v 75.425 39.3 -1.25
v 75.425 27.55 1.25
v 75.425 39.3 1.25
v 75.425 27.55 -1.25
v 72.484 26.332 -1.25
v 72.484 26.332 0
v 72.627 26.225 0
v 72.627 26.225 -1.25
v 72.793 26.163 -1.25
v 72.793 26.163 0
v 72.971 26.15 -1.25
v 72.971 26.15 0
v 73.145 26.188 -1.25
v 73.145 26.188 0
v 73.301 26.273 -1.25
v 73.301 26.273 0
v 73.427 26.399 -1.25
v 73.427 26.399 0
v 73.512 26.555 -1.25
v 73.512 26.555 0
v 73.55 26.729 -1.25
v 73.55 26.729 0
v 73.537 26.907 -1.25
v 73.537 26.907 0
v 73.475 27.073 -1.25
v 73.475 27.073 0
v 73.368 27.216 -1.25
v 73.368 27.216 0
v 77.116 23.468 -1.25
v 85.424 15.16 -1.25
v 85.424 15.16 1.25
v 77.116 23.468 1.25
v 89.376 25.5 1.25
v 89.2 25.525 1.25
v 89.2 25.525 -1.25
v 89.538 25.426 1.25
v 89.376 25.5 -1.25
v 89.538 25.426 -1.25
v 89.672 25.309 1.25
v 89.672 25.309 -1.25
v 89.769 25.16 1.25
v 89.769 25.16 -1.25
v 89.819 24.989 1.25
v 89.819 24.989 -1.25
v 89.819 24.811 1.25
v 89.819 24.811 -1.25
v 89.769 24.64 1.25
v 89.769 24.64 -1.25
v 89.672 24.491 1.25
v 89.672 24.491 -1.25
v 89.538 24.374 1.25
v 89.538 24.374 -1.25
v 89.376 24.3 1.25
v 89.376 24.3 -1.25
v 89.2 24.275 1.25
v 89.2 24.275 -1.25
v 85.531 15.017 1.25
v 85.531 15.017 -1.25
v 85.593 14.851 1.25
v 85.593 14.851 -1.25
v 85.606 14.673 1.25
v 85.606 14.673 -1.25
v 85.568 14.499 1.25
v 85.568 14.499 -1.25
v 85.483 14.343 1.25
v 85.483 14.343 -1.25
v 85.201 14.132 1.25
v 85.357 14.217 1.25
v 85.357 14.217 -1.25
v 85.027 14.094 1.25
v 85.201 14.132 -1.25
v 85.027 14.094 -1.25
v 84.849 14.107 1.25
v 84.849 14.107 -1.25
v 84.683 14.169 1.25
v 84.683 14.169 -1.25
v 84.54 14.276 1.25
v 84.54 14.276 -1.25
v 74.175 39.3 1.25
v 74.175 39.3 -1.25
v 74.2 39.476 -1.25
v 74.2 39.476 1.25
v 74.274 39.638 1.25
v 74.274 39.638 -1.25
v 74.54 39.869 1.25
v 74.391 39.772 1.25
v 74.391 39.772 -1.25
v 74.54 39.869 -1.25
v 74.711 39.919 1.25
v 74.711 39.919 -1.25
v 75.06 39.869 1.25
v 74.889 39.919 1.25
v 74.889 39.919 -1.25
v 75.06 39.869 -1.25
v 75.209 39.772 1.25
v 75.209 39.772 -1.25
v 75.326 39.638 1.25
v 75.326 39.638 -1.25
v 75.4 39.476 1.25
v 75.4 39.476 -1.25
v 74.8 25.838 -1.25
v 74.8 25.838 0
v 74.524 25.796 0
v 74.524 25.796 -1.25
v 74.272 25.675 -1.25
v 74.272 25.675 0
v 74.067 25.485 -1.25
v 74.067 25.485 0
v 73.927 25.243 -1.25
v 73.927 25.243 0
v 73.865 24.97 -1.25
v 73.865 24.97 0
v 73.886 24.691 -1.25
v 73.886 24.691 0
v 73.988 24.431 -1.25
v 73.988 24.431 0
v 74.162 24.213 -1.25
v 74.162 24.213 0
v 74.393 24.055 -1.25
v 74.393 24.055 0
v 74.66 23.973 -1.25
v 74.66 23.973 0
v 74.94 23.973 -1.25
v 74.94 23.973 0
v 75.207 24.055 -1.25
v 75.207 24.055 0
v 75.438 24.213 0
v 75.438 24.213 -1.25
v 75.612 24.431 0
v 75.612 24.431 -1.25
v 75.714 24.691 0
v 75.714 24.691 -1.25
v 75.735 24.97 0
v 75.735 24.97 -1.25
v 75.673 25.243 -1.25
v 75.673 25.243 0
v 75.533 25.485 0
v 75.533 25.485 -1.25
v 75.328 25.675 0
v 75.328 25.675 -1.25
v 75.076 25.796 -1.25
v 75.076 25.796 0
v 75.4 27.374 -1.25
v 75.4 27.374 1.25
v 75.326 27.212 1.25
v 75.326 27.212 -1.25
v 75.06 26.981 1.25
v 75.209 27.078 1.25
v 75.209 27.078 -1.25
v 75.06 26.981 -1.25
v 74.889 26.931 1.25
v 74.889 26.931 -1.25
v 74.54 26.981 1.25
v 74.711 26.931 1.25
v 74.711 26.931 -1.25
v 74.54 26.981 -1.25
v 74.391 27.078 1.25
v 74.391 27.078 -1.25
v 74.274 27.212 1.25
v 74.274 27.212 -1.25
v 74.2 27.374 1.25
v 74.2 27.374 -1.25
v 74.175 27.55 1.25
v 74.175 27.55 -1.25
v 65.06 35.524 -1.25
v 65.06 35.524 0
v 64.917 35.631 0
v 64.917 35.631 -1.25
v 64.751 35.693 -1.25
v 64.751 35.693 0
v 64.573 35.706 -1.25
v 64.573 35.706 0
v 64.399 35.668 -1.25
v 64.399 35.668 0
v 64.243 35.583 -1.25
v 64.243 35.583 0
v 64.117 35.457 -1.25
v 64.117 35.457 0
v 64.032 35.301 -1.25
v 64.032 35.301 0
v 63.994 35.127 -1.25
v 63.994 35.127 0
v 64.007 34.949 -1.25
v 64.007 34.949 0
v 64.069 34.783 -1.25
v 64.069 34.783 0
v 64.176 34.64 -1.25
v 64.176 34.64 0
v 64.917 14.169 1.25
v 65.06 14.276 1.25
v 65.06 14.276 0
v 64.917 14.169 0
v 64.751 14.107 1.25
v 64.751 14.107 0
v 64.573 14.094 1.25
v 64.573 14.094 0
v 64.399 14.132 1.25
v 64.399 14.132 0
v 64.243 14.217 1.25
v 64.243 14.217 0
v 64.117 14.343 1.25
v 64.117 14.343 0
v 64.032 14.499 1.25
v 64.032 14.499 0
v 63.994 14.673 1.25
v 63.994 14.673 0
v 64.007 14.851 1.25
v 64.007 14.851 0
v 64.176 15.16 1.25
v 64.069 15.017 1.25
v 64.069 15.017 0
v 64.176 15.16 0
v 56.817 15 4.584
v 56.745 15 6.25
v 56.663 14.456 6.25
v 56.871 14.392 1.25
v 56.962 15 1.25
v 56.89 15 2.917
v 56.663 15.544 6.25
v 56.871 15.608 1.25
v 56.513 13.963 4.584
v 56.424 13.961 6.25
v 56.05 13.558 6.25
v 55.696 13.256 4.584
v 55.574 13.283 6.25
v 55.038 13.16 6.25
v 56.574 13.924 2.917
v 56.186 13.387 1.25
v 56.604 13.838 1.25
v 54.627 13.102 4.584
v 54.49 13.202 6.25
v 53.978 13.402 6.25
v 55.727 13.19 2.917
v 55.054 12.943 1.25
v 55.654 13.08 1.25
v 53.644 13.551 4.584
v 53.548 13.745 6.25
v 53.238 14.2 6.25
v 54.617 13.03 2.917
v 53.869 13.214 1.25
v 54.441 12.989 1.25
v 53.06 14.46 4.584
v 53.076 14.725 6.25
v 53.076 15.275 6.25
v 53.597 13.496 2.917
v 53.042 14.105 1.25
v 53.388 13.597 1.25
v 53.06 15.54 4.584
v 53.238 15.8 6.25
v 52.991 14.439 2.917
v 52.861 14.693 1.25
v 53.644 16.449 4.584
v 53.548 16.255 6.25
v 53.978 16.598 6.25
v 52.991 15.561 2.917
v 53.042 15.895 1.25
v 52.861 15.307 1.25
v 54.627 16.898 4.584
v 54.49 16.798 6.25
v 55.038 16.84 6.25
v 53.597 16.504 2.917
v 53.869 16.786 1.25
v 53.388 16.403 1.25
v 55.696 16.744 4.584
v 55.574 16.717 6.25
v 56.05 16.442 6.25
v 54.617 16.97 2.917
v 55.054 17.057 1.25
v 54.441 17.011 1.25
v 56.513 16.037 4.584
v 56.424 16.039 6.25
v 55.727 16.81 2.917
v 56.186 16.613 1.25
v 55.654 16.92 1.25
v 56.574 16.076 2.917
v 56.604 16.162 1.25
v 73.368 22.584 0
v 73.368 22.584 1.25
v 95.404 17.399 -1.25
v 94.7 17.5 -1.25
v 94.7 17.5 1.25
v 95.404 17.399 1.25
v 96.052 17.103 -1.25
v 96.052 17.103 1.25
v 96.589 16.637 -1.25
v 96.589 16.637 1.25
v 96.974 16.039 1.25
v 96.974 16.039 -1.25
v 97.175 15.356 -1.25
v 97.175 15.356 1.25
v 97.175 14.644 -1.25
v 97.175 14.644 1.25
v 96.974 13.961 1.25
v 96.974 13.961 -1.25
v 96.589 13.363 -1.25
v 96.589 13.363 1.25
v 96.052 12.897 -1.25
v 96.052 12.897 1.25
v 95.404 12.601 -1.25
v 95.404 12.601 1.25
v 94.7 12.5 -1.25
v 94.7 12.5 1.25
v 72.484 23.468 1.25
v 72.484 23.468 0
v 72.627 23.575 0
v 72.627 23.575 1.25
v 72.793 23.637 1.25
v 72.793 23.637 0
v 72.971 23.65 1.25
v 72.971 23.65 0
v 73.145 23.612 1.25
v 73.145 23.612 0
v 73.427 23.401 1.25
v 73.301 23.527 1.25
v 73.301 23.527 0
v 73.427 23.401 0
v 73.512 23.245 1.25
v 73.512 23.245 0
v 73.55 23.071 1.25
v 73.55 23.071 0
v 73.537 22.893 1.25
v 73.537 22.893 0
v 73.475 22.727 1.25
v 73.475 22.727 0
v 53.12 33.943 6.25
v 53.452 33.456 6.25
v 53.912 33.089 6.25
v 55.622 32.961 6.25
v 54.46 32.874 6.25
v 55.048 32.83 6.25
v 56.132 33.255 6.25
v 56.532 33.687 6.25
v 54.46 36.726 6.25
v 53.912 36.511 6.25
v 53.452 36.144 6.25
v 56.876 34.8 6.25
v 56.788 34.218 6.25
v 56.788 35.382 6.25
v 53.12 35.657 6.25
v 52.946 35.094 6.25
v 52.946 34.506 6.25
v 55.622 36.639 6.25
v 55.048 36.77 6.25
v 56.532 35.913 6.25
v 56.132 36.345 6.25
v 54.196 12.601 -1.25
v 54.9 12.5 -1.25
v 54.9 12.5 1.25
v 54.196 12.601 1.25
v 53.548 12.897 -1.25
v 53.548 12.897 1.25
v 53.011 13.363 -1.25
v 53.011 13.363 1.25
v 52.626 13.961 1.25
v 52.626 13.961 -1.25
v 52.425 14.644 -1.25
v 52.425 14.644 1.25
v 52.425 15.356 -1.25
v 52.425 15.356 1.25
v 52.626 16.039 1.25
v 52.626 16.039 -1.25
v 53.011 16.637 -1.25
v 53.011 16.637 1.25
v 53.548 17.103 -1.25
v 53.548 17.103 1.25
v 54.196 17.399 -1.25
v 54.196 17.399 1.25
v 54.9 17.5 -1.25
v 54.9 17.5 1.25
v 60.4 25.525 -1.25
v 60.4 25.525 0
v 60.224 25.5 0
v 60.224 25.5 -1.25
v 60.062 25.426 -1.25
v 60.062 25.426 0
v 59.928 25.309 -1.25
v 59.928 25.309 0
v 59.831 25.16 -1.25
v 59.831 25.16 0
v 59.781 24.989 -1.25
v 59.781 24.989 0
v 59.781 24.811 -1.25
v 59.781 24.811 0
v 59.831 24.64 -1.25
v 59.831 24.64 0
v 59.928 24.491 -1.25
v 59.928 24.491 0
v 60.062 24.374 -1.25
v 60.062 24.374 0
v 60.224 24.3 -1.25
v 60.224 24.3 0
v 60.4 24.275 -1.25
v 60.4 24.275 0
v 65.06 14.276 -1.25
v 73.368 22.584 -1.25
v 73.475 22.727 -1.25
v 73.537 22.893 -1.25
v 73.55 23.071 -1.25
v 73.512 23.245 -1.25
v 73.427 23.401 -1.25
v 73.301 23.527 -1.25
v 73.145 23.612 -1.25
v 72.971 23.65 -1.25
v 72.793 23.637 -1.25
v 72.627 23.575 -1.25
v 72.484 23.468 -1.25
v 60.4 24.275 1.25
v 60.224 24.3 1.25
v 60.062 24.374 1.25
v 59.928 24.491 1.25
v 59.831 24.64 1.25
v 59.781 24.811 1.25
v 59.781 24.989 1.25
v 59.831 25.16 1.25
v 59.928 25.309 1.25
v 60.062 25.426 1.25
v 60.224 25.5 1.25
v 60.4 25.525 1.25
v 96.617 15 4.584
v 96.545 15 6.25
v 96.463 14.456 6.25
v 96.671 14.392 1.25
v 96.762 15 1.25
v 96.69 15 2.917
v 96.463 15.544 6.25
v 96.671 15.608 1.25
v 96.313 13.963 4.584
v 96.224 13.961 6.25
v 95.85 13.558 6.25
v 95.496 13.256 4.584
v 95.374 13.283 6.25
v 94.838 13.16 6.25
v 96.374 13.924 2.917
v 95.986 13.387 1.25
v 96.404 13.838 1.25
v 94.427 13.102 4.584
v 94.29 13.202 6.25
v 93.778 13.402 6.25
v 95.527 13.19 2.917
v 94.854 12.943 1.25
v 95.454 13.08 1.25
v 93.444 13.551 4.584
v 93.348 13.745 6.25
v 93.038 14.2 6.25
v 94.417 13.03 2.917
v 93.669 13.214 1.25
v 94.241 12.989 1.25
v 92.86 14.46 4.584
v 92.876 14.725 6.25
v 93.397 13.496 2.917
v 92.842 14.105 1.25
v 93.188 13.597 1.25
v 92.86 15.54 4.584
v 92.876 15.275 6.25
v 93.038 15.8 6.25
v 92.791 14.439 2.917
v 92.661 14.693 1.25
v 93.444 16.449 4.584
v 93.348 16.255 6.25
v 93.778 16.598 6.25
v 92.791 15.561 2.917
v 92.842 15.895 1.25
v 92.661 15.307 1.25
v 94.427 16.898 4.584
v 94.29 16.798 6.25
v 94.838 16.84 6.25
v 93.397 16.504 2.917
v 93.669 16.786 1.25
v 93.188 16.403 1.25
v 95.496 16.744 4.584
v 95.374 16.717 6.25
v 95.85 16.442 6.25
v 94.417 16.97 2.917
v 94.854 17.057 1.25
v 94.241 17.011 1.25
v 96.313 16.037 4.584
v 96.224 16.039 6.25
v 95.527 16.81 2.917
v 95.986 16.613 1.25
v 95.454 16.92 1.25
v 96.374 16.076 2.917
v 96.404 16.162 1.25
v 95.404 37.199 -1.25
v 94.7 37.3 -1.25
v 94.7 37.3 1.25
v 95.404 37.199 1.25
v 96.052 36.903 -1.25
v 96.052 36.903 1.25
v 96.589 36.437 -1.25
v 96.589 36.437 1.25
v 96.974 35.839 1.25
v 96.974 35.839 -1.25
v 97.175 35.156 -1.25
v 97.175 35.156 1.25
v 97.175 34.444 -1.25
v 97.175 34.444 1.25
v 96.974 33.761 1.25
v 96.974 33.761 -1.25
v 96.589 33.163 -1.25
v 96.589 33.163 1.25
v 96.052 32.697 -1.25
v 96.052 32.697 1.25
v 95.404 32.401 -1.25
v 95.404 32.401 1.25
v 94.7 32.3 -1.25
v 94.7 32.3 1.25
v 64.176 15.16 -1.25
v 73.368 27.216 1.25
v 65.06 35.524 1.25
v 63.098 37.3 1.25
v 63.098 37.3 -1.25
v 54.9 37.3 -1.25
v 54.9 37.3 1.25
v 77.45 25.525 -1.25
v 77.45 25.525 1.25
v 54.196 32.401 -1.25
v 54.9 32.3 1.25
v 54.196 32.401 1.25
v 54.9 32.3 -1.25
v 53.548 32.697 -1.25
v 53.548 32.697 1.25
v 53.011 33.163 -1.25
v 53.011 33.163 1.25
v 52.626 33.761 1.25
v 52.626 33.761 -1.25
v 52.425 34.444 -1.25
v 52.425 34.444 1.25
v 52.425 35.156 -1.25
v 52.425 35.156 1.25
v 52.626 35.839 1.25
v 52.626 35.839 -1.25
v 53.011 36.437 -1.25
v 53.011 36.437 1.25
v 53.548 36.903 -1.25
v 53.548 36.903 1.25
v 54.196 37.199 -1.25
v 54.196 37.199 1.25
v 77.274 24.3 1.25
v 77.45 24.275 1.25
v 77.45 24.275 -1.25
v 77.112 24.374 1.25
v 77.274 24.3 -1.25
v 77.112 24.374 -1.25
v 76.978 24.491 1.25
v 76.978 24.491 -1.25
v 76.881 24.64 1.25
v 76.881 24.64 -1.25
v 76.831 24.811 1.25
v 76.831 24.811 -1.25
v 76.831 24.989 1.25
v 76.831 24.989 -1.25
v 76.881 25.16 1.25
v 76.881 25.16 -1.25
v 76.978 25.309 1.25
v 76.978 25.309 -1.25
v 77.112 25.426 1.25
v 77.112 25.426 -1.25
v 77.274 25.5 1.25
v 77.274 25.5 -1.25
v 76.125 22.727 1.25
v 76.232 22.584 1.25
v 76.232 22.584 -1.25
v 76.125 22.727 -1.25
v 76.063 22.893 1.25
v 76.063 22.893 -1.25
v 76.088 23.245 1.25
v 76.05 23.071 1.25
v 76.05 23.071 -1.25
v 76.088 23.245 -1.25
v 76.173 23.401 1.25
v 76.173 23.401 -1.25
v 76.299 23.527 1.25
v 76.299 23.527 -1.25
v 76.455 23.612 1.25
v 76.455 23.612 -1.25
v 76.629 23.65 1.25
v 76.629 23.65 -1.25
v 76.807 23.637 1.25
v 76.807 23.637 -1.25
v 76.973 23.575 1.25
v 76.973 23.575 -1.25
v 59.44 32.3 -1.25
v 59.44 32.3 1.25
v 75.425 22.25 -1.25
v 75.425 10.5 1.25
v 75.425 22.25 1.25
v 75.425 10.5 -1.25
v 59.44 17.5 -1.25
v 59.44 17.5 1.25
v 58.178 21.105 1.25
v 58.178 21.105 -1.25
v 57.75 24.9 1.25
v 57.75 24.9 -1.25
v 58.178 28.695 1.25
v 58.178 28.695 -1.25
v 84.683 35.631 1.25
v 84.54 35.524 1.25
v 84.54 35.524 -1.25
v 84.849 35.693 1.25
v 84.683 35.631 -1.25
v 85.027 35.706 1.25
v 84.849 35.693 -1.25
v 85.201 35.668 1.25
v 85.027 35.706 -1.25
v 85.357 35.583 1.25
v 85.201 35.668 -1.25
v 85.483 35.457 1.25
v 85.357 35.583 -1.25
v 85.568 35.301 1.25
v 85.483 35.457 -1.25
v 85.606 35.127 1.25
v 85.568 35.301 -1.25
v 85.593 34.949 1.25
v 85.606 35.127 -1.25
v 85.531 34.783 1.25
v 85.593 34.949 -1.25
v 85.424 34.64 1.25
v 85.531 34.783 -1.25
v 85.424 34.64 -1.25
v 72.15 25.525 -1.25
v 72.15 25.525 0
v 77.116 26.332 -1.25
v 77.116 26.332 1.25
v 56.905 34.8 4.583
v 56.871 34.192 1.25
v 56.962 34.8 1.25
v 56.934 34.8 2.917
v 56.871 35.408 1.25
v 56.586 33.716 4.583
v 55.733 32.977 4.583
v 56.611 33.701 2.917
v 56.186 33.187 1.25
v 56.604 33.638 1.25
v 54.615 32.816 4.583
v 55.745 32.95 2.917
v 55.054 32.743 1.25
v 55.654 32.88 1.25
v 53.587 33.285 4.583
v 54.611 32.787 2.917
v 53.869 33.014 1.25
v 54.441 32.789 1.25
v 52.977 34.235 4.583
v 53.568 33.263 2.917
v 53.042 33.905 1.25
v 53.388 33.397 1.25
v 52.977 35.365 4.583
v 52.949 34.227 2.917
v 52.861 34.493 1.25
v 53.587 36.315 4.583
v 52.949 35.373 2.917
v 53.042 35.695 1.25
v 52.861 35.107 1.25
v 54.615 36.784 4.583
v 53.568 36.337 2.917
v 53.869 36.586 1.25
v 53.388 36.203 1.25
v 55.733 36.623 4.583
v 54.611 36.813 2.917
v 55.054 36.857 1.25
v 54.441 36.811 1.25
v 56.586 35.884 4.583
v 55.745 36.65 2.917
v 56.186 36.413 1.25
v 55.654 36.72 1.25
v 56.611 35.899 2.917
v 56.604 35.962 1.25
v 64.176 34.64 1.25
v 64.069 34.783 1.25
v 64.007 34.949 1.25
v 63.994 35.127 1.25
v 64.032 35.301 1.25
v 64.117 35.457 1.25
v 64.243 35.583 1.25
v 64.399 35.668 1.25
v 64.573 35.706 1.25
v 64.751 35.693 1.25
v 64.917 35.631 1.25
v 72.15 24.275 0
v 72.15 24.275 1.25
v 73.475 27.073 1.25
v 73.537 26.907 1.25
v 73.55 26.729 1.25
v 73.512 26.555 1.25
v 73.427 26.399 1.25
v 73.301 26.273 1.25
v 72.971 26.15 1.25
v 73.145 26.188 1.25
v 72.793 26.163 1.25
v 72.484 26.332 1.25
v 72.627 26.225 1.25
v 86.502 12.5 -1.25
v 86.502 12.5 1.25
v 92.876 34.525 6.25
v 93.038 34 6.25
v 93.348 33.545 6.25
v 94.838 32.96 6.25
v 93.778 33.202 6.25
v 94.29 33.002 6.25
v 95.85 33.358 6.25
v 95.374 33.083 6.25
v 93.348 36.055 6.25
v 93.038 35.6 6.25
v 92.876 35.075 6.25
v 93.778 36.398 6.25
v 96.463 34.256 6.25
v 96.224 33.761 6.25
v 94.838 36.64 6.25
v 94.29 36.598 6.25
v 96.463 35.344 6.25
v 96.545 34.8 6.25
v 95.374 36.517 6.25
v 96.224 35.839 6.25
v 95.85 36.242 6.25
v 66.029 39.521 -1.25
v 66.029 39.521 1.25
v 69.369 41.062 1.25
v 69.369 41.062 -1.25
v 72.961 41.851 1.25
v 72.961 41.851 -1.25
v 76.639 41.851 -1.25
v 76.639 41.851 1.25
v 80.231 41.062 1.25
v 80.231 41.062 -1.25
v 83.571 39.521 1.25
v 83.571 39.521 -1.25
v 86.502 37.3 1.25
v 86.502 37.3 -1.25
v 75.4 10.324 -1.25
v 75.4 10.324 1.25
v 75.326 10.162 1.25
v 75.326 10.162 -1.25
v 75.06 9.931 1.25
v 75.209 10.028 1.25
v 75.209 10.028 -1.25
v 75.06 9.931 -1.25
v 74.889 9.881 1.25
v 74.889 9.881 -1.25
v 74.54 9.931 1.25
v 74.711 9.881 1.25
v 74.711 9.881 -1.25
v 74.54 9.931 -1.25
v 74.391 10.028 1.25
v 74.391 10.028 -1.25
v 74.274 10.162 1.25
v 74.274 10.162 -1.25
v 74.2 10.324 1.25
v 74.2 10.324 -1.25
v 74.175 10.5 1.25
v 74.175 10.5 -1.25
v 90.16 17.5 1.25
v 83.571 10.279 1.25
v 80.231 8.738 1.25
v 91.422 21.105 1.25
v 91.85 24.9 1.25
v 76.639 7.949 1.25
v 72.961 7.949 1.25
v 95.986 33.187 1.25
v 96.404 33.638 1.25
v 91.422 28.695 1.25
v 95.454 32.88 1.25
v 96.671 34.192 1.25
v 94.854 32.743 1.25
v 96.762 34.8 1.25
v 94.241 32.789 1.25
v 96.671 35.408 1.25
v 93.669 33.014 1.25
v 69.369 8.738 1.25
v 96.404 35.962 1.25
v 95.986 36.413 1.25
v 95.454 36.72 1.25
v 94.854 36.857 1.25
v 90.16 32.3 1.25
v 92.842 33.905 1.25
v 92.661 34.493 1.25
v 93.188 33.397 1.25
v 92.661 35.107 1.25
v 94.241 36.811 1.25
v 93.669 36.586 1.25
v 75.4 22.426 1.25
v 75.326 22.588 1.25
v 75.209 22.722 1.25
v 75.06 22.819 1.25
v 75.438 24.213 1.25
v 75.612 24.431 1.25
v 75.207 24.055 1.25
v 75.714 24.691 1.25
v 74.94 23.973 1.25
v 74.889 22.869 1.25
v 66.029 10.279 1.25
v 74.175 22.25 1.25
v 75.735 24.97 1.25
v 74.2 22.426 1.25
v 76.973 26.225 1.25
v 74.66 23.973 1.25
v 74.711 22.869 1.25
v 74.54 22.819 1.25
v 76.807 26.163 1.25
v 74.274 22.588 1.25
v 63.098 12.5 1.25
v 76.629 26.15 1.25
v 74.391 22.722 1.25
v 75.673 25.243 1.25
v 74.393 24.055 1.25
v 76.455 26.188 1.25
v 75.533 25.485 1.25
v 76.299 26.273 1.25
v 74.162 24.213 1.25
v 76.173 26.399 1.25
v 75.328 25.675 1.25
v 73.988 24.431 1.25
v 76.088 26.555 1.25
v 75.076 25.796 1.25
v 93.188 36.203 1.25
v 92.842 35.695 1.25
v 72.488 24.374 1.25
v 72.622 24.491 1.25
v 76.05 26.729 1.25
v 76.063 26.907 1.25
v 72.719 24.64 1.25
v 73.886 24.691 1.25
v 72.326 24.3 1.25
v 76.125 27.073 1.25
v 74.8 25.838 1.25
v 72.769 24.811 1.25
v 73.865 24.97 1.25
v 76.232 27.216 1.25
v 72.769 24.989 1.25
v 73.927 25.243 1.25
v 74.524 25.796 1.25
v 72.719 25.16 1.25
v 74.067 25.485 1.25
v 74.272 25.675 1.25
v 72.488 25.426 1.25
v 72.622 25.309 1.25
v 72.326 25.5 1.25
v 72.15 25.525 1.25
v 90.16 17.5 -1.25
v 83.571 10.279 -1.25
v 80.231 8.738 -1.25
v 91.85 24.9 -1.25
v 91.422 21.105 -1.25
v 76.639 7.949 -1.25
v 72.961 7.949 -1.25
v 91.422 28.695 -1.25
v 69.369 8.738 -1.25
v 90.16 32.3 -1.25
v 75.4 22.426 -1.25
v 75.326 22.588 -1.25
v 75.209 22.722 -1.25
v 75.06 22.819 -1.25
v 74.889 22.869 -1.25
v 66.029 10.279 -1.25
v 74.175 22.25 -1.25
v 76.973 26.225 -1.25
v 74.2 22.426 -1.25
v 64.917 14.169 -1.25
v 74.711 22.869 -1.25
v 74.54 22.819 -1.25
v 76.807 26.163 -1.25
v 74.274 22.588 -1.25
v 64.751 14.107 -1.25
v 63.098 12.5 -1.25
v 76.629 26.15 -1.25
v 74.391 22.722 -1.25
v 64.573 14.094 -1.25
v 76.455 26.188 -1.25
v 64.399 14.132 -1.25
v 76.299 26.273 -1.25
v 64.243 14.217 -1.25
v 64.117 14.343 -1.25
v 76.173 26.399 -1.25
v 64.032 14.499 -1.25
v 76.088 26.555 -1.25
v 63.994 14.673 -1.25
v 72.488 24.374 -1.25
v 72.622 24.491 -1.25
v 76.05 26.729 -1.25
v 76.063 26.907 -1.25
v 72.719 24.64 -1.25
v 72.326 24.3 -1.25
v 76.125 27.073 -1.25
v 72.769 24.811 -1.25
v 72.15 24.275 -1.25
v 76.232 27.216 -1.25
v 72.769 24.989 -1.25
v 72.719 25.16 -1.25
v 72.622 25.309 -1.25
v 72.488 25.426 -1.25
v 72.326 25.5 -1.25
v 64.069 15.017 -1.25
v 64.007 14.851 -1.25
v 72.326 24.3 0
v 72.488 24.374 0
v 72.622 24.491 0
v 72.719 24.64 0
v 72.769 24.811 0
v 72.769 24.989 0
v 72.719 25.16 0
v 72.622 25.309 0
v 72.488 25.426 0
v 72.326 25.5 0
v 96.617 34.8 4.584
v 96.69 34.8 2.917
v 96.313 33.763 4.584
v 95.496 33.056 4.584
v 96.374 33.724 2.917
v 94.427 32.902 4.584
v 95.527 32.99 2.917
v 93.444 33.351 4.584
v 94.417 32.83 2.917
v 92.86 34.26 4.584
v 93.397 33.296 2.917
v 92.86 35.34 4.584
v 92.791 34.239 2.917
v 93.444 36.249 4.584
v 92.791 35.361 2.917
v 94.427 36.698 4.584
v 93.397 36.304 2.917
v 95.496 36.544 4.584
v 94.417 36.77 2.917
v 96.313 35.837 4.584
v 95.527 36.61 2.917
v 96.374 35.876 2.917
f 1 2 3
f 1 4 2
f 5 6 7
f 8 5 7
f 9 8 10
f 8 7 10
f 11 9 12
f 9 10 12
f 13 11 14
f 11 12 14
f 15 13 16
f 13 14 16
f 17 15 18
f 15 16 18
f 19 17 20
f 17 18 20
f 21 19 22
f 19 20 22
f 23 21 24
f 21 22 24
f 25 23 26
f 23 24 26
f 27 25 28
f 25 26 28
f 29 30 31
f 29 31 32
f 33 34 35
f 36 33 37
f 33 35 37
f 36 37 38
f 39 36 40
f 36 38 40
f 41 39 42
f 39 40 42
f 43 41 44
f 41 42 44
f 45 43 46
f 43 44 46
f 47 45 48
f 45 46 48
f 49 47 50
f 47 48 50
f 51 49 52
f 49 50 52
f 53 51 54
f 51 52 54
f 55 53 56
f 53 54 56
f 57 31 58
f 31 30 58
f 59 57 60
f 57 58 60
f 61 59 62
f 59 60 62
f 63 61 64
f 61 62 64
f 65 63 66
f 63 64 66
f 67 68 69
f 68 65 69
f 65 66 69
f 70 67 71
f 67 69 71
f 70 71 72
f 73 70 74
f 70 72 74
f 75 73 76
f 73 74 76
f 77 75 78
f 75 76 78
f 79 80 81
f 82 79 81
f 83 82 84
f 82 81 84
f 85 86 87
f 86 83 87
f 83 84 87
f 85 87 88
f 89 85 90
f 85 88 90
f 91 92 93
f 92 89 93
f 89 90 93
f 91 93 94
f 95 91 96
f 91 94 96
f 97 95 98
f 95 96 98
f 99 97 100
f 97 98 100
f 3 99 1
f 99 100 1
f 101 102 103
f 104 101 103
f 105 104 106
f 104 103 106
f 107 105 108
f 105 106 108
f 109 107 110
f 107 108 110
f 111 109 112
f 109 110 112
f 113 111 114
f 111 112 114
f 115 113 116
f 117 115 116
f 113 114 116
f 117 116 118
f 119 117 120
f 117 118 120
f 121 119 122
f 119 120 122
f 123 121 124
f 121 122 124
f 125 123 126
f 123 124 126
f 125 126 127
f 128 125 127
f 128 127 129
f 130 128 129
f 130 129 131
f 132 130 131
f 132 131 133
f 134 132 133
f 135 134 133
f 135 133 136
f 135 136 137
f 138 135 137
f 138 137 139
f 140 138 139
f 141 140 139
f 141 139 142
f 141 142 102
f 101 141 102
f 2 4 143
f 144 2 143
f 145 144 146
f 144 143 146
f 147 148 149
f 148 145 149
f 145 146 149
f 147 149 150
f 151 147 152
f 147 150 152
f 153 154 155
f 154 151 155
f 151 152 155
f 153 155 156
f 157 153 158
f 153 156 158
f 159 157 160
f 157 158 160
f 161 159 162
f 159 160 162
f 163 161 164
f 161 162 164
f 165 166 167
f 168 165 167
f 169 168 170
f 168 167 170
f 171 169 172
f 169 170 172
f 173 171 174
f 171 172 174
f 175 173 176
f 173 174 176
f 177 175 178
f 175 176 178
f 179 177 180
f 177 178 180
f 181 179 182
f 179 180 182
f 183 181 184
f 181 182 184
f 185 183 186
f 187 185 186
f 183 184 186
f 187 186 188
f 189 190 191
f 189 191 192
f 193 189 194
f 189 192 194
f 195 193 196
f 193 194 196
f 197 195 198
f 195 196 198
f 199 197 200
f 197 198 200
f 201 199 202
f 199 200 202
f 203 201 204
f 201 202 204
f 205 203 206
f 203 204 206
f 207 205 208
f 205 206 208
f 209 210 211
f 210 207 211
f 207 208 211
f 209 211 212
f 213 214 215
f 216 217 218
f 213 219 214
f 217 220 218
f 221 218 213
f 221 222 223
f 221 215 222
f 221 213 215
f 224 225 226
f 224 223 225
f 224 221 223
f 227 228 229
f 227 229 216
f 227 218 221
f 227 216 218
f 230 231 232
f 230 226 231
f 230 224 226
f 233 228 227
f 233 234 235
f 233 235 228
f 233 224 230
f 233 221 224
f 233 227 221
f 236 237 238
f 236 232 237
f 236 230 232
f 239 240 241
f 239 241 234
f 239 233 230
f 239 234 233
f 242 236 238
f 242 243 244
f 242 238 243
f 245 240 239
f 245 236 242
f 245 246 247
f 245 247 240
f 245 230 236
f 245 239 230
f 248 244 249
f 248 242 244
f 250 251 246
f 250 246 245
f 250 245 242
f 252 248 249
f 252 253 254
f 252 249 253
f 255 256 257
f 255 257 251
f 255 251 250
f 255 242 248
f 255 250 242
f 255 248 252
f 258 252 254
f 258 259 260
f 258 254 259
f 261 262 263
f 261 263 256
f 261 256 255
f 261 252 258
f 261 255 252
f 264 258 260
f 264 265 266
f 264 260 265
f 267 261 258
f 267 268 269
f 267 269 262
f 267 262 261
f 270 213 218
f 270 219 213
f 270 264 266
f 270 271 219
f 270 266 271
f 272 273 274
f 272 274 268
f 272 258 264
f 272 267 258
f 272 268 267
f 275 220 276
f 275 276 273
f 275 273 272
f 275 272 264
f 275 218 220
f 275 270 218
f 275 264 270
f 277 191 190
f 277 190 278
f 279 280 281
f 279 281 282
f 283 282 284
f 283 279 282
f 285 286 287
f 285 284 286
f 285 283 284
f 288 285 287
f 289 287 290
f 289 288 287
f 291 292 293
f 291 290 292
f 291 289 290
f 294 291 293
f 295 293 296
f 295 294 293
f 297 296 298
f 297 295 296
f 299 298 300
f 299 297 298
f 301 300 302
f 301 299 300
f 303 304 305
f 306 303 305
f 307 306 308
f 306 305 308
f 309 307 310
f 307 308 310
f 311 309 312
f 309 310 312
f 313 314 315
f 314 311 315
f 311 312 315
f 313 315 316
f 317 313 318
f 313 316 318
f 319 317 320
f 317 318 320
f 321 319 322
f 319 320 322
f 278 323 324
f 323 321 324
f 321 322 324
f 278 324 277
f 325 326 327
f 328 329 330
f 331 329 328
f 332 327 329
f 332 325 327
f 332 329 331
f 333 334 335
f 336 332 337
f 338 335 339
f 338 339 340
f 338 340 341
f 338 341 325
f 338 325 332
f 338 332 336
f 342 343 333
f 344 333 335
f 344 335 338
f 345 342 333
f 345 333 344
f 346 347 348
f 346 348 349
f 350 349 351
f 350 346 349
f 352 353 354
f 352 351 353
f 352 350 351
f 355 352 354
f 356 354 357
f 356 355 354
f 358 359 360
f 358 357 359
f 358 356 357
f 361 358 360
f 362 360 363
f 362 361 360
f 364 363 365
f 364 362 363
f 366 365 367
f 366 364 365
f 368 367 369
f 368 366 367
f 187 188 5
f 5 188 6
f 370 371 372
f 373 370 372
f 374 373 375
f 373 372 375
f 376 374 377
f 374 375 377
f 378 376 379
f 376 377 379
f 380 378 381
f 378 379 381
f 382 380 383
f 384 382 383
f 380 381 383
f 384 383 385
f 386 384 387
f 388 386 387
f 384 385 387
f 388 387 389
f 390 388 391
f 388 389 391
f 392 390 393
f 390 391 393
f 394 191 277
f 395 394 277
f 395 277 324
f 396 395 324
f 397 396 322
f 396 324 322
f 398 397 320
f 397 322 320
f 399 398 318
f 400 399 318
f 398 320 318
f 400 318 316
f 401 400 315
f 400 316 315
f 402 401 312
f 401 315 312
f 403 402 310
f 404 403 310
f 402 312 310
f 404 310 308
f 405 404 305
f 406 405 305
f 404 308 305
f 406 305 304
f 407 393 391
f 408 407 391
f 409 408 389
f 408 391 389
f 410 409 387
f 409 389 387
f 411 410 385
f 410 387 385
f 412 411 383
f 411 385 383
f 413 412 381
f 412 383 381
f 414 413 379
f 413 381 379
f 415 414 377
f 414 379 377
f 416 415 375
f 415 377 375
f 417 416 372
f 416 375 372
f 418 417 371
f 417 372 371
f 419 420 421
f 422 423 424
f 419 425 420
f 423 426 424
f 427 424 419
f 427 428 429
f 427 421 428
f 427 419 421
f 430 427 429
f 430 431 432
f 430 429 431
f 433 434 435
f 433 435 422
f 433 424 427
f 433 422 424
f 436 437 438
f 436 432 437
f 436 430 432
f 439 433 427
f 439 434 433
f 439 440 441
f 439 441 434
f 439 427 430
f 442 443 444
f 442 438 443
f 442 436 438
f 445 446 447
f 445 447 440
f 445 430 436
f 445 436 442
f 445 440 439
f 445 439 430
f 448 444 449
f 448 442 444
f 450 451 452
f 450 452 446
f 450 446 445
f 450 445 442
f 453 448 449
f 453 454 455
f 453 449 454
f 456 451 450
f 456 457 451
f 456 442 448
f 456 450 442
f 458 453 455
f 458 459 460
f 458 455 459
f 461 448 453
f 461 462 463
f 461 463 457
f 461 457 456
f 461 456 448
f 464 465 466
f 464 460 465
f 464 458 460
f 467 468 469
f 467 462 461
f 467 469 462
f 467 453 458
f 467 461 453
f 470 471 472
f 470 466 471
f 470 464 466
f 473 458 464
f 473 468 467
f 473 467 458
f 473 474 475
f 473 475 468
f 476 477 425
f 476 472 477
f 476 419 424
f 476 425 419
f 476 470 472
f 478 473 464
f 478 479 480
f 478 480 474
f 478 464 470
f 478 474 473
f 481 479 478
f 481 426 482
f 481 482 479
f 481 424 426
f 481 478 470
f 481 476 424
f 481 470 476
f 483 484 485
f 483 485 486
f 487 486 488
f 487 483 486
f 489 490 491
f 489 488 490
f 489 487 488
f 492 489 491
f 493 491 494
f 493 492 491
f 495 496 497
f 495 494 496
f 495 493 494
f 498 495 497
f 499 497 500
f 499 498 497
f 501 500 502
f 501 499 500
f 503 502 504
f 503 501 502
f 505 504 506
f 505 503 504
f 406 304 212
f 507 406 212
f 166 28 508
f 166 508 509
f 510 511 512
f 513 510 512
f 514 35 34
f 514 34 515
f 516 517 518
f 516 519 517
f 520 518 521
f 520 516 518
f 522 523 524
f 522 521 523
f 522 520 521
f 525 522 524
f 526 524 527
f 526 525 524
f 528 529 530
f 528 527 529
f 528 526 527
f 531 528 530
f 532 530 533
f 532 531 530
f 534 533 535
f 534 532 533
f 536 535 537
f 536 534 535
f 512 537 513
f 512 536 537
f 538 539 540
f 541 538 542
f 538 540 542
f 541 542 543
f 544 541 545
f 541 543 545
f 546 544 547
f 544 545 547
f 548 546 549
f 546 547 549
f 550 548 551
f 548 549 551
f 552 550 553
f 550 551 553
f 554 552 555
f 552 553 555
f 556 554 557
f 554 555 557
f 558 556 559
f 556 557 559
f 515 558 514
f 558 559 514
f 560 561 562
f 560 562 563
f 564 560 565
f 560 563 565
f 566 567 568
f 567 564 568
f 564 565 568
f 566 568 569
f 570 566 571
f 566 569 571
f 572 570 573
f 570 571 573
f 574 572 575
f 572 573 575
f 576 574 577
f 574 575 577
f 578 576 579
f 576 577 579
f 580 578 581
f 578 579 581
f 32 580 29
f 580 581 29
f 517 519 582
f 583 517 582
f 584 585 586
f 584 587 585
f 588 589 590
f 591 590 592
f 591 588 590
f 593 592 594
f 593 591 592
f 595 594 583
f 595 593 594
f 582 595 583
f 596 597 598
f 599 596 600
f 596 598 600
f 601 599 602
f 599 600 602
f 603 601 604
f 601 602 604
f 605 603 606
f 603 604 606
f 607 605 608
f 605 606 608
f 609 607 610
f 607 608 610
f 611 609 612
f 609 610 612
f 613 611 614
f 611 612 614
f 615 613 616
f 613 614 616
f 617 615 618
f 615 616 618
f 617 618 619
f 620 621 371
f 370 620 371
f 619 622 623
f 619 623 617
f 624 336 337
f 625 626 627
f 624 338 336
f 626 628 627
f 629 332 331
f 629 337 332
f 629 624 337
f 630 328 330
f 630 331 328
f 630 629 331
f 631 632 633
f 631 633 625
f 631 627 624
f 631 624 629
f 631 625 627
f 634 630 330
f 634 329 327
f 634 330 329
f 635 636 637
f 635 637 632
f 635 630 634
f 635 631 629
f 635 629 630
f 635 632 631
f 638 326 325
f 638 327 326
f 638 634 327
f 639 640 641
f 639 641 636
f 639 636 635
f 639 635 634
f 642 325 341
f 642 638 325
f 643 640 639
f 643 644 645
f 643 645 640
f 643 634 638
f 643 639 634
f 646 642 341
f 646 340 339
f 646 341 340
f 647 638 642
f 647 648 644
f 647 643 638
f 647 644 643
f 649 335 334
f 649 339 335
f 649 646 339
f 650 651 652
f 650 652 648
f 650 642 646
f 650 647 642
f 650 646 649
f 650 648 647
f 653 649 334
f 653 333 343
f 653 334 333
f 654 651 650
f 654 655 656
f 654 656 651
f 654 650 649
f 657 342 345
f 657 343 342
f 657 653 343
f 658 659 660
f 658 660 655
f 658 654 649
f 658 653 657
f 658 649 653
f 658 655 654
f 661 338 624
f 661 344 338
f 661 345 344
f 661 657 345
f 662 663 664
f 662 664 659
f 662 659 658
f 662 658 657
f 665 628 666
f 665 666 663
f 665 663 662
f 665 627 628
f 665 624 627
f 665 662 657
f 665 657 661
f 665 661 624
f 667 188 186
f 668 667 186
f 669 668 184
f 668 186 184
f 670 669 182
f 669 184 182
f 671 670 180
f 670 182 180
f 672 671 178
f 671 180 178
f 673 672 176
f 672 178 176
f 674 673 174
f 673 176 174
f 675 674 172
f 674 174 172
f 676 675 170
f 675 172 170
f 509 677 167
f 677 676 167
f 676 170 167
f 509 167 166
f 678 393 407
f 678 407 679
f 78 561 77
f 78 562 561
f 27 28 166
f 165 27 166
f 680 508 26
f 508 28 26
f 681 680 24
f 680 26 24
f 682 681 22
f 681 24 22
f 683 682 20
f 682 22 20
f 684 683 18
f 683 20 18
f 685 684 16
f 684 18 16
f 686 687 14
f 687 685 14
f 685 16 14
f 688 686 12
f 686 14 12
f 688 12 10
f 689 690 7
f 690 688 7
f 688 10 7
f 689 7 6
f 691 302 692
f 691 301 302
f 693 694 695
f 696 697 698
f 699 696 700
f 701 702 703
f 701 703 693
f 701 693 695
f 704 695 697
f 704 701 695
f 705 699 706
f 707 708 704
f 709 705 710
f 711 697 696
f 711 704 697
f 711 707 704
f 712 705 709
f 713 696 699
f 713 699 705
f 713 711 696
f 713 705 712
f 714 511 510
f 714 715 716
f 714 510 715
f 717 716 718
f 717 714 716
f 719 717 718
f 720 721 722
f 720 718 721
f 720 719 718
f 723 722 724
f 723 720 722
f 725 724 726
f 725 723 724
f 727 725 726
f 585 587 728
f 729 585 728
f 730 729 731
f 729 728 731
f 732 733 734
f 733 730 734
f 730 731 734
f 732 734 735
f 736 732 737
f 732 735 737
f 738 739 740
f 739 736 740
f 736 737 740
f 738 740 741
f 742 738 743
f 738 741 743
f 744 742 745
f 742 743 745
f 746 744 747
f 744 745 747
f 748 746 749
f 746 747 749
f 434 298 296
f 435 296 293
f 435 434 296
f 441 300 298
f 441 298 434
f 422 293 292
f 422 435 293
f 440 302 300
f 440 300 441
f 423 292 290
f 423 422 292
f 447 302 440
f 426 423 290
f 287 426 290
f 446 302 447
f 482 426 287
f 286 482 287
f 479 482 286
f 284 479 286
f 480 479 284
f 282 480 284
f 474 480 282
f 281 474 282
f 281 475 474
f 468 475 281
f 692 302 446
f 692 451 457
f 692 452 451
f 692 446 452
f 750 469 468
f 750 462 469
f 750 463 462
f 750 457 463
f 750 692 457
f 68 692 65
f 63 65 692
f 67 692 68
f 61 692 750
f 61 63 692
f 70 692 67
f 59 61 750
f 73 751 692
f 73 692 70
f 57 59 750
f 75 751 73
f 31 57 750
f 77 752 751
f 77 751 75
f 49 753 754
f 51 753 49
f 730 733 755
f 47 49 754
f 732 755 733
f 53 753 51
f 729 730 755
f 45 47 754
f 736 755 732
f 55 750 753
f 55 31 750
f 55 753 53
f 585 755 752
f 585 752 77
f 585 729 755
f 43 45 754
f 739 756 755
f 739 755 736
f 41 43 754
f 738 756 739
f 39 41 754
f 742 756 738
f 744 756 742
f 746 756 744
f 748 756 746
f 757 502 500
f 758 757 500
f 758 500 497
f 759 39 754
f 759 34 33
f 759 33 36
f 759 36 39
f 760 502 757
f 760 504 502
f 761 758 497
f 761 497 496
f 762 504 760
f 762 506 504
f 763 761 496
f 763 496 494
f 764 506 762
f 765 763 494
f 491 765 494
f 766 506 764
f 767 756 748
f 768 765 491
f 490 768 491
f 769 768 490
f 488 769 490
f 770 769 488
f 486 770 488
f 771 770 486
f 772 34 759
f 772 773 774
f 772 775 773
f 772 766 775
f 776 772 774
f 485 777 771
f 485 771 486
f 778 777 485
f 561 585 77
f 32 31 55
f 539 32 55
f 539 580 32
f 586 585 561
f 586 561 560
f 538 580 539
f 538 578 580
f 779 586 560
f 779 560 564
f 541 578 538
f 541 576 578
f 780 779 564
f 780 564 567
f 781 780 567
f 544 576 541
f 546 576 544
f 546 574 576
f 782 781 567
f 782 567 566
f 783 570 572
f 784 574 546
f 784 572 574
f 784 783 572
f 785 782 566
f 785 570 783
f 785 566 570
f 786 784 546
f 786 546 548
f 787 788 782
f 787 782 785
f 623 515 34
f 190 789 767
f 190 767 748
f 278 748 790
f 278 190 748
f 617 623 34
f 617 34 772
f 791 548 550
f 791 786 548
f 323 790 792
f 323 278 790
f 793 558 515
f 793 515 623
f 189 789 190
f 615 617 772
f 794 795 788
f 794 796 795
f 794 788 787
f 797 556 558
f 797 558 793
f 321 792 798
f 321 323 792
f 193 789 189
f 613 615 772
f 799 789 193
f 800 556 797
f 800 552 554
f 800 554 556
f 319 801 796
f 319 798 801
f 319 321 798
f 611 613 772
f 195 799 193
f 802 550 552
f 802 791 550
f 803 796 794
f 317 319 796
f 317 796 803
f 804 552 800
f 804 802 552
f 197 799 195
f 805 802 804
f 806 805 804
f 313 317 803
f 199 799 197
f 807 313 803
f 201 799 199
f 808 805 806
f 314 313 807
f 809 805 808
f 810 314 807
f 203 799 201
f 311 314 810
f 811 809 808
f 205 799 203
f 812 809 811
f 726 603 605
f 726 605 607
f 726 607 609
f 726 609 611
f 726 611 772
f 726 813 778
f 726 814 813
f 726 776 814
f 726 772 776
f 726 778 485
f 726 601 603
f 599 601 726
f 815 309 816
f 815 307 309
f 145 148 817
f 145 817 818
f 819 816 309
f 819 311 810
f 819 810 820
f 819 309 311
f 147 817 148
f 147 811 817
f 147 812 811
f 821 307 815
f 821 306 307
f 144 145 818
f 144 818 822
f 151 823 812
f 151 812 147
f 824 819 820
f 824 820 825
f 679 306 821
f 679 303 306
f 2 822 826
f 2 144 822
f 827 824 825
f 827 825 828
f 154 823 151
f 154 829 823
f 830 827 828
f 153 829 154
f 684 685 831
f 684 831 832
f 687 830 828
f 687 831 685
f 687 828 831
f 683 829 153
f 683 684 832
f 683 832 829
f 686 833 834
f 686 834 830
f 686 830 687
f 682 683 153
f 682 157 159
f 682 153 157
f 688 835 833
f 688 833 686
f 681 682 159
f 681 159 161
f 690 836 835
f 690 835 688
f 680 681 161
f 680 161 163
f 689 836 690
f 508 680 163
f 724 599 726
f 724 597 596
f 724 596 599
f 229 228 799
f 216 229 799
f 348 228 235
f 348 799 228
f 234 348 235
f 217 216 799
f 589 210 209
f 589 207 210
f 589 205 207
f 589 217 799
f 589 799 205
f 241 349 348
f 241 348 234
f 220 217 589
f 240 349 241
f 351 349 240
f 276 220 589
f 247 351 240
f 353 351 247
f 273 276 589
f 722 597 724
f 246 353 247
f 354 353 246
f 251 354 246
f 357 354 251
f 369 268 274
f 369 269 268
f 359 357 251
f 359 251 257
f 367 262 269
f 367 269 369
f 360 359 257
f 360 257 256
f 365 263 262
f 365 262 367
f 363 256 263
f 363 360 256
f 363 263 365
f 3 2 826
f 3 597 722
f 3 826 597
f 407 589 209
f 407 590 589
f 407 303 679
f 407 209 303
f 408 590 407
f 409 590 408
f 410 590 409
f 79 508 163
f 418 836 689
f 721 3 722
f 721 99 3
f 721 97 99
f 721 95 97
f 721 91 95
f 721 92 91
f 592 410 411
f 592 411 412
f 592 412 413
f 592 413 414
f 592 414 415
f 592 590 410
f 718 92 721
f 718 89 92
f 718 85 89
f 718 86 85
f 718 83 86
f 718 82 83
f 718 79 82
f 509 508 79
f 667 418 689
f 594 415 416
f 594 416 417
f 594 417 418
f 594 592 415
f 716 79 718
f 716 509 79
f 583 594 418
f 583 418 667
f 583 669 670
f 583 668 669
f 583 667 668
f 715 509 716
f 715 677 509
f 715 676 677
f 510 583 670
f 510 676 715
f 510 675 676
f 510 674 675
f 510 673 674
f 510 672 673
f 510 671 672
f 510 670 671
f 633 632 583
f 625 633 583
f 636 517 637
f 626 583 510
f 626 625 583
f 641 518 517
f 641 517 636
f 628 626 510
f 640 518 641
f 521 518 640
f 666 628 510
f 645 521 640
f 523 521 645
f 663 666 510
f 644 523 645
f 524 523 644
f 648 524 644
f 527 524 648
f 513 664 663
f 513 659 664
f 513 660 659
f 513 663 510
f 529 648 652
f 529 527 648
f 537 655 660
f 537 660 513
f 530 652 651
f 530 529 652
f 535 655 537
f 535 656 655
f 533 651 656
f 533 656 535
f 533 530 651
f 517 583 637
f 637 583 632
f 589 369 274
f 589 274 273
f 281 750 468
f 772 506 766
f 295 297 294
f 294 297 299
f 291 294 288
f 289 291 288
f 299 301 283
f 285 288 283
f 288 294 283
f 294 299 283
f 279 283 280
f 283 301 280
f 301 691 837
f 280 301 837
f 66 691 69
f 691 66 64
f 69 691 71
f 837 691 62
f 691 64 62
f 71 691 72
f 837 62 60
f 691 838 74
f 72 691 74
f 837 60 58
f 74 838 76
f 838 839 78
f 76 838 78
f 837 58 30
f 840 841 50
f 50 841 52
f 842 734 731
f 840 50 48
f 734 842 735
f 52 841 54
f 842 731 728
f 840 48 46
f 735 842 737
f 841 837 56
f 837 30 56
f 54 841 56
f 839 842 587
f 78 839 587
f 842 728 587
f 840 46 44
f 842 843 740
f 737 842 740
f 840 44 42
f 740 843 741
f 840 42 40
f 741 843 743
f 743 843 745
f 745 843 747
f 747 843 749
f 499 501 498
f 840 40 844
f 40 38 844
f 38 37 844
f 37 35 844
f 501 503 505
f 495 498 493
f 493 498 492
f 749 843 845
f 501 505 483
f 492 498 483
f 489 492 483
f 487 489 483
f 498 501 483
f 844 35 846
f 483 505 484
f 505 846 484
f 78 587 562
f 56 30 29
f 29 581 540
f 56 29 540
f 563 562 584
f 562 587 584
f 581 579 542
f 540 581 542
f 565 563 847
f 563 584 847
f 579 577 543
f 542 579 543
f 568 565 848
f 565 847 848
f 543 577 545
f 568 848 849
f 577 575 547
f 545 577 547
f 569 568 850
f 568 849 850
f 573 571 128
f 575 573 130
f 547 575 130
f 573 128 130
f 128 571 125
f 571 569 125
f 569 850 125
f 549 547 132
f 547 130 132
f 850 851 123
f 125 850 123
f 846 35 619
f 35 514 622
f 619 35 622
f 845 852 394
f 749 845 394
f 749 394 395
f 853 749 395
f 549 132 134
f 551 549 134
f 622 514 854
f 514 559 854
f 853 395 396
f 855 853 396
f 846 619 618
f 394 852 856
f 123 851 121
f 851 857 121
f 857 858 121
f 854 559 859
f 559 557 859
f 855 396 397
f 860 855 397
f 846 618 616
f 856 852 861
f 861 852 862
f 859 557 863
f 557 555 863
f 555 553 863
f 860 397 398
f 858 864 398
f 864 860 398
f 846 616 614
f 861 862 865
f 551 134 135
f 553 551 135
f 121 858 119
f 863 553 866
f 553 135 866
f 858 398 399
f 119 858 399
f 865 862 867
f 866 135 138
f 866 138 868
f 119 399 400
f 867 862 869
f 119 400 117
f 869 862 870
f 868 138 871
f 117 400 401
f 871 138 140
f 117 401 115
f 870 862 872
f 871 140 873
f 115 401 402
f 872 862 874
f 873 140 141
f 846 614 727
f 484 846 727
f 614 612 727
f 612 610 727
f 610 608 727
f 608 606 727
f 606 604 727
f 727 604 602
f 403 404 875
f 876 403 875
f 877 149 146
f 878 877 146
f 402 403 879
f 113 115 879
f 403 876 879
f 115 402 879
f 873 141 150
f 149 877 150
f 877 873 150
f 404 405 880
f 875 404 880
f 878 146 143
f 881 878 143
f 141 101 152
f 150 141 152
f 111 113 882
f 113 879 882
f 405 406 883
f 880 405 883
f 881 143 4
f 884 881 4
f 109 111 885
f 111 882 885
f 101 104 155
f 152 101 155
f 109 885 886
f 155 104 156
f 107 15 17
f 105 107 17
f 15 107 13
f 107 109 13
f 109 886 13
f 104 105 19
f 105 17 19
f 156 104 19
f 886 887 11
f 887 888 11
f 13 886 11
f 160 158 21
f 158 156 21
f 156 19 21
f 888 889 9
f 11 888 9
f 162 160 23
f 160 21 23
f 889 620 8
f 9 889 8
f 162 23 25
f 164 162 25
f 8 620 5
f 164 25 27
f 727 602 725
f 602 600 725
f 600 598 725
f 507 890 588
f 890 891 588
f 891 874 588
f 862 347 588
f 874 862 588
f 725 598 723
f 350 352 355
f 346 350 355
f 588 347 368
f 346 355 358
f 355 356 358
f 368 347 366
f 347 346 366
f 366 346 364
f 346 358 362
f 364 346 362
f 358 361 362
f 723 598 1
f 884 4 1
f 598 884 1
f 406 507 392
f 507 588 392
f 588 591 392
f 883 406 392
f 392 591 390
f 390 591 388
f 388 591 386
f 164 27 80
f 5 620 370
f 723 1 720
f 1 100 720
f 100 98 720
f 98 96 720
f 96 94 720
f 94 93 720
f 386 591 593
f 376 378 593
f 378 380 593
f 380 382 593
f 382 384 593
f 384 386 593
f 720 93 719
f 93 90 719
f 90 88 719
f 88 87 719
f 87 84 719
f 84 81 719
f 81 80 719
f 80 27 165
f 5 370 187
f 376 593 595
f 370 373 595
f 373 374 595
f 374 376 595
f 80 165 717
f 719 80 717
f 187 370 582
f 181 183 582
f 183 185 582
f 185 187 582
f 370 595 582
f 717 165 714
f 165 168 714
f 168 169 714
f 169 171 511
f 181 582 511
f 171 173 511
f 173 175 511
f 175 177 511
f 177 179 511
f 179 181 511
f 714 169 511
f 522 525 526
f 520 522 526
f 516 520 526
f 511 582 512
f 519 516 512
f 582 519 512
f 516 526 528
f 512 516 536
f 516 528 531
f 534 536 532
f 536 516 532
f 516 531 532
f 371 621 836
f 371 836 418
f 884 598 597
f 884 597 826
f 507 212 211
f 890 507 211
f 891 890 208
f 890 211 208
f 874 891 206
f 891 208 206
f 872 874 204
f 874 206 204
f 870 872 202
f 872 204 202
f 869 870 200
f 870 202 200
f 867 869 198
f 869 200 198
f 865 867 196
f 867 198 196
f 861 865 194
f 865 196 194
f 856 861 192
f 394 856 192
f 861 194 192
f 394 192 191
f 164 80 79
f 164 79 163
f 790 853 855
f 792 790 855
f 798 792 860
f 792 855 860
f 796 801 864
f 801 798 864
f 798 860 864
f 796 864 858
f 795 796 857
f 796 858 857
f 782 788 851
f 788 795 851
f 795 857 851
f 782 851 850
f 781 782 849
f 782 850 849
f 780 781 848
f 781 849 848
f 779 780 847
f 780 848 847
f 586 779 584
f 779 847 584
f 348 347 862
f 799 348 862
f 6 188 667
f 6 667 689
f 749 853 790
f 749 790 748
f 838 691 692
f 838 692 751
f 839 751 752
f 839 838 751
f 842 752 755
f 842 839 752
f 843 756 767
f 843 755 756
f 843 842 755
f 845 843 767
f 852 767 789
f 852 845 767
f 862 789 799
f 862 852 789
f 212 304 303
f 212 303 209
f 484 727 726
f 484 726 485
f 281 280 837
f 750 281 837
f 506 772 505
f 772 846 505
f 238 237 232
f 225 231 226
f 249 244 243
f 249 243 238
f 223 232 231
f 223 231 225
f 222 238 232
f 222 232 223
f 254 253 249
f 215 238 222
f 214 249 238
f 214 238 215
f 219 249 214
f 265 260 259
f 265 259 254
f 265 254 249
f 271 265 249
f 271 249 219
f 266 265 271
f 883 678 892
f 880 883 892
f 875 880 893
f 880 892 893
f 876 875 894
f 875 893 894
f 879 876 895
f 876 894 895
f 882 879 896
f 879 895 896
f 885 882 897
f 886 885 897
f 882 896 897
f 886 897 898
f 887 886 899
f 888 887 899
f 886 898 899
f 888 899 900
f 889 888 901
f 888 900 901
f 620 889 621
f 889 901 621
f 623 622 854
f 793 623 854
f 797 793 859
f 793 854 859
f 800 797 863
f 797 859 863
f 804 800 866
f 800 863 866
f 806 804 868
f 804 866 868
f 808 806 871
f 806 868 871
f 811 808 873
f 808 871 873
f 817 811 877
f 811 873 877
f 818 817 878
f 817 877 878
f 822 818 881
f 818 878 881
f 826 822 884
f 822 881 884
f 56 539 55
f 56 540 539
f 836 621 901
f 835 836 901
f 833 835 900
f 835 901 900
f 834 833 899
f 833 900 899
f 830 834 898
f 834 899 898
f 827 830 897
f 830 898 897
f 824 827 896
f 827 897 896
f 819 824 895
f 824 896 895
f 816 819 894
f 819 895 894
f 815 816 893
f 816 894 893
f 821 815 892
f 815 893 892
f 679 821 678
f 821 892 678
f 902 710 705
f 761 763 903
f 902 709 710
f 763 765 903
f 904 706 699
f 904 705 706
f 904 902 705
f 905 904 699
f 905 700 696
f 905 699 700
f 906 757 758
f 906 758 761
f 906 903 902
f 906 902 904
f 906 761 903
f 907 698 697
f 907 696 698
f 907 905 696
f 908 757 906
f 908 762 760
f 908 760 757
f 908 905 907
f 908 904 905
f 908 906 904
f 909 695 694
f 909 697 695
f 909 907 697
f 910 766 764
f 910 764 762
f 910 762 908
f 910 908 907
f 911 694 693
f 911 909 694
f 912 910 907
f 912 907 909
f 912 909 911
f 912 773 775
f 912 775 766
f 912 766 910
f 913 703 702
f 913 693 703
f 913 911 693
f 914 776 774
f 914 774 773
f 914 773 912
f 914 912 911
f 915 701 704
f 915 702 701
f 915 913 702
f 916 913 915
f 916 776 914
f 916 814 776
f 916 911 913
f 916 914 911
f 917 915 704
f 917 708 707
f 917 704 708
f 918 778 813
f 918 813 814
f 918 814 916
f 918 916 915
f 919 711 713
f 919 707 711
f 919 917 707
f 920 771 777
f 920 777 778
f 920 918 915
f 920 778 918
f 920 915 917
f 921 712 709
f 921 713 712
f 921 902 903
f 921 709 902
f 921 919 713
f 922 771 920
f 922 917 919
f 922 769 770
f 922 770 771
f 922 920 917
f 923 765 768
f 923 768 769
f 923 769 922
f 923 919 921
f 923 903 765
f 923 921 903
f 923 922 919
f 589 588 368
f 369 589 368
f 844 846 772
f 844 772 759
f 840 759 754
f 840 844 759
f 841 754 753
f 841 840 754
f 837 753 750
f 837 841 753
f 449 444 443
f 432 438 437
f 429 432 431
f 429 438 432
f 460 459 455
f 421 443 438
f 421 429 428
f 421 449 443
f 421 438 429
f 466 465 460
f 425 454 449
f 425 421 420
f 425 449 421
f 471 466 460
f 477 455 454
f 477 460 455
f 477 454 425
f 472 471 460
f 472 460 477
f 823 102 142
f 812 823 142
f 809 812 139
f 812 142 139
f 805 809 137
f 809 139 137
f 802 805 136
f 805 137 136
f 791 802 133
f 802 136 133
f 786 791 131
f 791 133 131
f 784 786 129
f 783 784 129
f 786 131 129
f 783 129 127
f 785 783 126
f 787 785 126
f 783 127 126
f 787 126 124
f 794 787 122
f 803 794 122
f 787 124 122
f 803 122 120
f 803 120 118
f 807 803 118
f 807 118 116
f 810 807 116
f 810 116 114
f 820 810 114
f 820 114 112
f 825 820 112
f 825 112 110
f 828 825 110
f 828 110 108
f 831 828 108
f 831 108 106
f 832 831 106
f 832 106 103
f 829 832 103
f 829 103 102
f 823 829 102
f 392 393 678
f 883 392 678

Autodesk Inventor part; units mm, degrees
ref_plane "YZ Plane" through (0, 0, 0) normal (1, 0, 0) x (0, 1, 0)
ref_plane "XZ Plane" through (0, 0, 0) normal (0, 1, 0) x (-1, 0, 0)
ref_plane "XY Plane" through (0, 0, 0) normal (0, 0, 1) x (1, 0, 0)
sketch "Sketch2" plane through (0, 0, 0) normal (0, 0, 1) x (0, 1, 0)
  line L0 (24.9, -57.75) -> (24.9, -91.85)
  circle A0 centre (24.9, -74.8) radius 17.05
  circle A1 centre (24.9, -74.8) radius 0.9375
  line L1 (24.9, -74.8) -> (36.9562, -86.8562)
  line L2 (24.9, -74.8) -> (41.95, -74.8) construction
  line L3 (26.7738, -76.6738) -> (35.0823, -84.9823) construction
  line L4 (26.3319, -77.1158) -> (34.6404, -85.4243)
  line L5 (35.5243, -84.5404) -> (27.2158, -76.2319)
  arc A2 (27.2158, -76.2319) -> (26.3319, -77.1158) centre (26.7738, -76.6738) ccw
  arc A3 (34.6404, -85.4243) -> (35.5243, -84.5404) centre (35.0823, -84.9823) ccw
  line L6 (30.9281, -80.8281) -> (42.6781, -80.8281) construction
  line L7 (34.8, -54.9) -> (34.8, -60.9186) construction
  line L8 (32.3, -54.9) -> (32.3, -60.9186)
  line L9 (37.3, -60.9186) -> (37.3, -54.9)
  arc A4 (37.3, -54.9) -> (32.3, -54.9) centre (34.8, -54.9) ccw
  arc A5 (32.3, -60.9186) -> (37.3, -60.9186) centre (34.8, -60.9186) ccw
  line L10 (15, -54.9) -> (15, -60.9186) construction
  line L11 (12.5, -54.9) -> (12.5, -60.9186)
  line L12 (17.5, -60.9186) -> (17.5, -54.9)
  arc A6 (17.5, -54.9) -> (12.5, -54.9) centre (15, -54.9) ccw
  arc A7 (12.5, -60.9186) -> (17.5, -60.9186) centre (15, -60.9186) ccw
  line L13 (15, -94.7) -> (15, -88.6814) construction
  line L14 (17.5, -94.7) -> (17.5, -88.6814)
  line L15 (12.5, -88.6814) -> (12.5, -94.7)
  arc A8 (12.5, -94.7) -> (17.5, -94.7) centre (15, -94.7) ccw
  arc A9 (17.5, -88.6814) -> (12.5, -88.6814) centre (15, -88.6814) ccw
  line L16 (34.8, -94.7) -> (34.8, -88.6814) construction
  line L17 (37.3, -94.7) -> (37.3, -88.6814)
  line L18 (32.3, -88.6814) -> (32.3, -94.7)
  arc A10 (32.3, -94.7) -> (37.3, -94.7) centre (34.8, -94.7) ccw
  arc A11 (37.3, -88.6814) -> (32.3, -88.6814) centre (34.8, -88.6814) ccw
  line L19 (39.3, -74.175) -> (27.55, -74.175)
  arc A12 (39.3, -75.425) -> (39.3, -74.175) centre (39.3, -74.8) ccw
  line L20 (27.55, -75.425) -> (39.3, -75.425)
  arc A13 (27.55, -74.175) -> (27.55, -75.425) centre (27.55, -74.8) ccw
  line L21 (34.6404, -64.1757) -> (26.3319, -72.4842)
  arc A14 (35.5243, -65.0596) -> (34.6404, -64.1757) centre (35.0823, -64.6177) ccw
  line L22 (27.2158, -73.3681) -> (35.5243, -65.0596)
  arc A15 (26.3319, -72.4842) -> (27.2158, -73.3681) centre (26.7738, -72.9262) ccw
  line L23 (24.275, -60.4) -> (24.275, -72.15)
  arc A16 (25.525, -60.4) -> (24.275, -60.4) centre (24.9, -60.4) ccw
  line L24 (25.525, -72.15) -> (25.525, -60.4)
  arc A17 (24.275, -72.15) -> (25.525, -72.15) centre (24.9, -72.15) ccw
  line L25 (14.2757, -65.0596) -> (22.5842, -73.3681)
  arc A18 (15.1596, -64.1757) -> (14.2757, -65.0596) centre (14.7177, -64.6177) ccw
  line L26 (23.4681, -72.4842) -> (15.1596, -64.1757)
  arc A19 (22.5842, -73.3681) -> (23.4681, -72.4842) centre (23.0262, -72.9262) ccw
  line L27 (10.5, -75.425) -> (22.25, -75.425)
  arc A20 (10.5, -74.175) -> (10.5, -75.425) centre (10.5, -74.8) ccw
  line L28 (22.25, -74.175) -> (10.5, -74.175)
  arc A21 (22.25, -75.425) -> (22.25, -74.175) centre (22.25, -74.8) ccw
  line L29 (15.1596, -85.4243) -> (23.4681, -77.1158)
  arc A22 (14.2757, -84.5404) -> (15.1596, -85.4243) centre (14.7177, -84.9823) ccw
  line L30 (22.5842, -76.2319) -> (14.2757, -84.5404)
  arc A23 (23.4681, -77.1158) -> (22.5842, -76.2319) centre (23.0262, -76.6738) ccw
  line L31 (25.525, -89.2) -> (25.525, -77.45)
  arc A24 (24.275, -89.2) -> (25.525, -89.2) centre (24.9, -89.2) ccw
  line L32 (24.275, -77.45) -> (24.275, -89.2)
  arc A25 (25.525, -77.45) -> (24.275, -77.45) centre (24.9, -77.45) ccw
  line L33 (37.3, -60.9186) -> (37.3, -88.6814)
  line L34 (12.5, -88.6814) -> (12.5, -60.9186)
  line L35 (0.025, -97.7) -> (0.025, -51.9) projected
  line L36 (42.1, -97.7) -> (0.025, -97.7) projected
  line L37 (42.1, -97.7) -> (42.1, -91.85) projected
  line L38 (7.7, -91.85) -> (42.1, -91.85) projected
  line L39 (7.7, -57.75) -> (7.7, -91.85) projected
  line L40 (7.7, -57.75) -> (42.1, -57.75) projected
  line L41 (42.1, -57.75) -> (42.1, -51.9) projected
  line L42 (0.025, -51.9) -> (42.1, -51.9) projected
  circle A26 centre (34.8, -94.7) radius 2.0625 projected
  circle A27 centre (34.8, -54.9) radius 2.0625 projected
  circle A28 centre (15, -94.7) radius 2.0625 projected
  circle A29 centre (15, -54.9) radius 2.0625 projected
  point P0 (0, 0)
  point P1 (34.8, -57.9093)
  point P2 (15, -57.9093)
  point P3 (15, -91.6907)
  point P4 (34.8, -91.6907)
  point P5 (17.5, -59.4396)
  point P6 (13.0765, -62.5156)
  point P7 (13.0765, -87.0844)
  point P8 (17.5, -90.1604)
  point P9 (32.3, -90.1604)
  point P10 (36.7235, -87.0844)
  point P11 (36.7235, -62.5156)
  point P12 (32.3, -59.4396)
  point P13 (12.5, -63.0978)
  point P14 (12.5, -86.5022)
  point P15 (37.3, -86.5022)
  point P16 (37.3, -63.0978)
  dimension "d32" = 1.875
  dimension "d33" = 45
  dimension "d34" = 5.875
  dimension "d35" = 45
  dimension "d36" = 1.25
  dimension "d37" = 5
  dimension "d38" = 5
  dimension "d39" = 5
  dimension "d40" = 5
  dimension "d43" = 360
extrude "Extrusion2" add sketch "Sketch2" along normal mid plane 2.5 contours A0 L8 A5 L33 L19 A13 L20 L1 A3 L5 A2 A1 L0 A17 L24 A16 | L0 A16 L23 A17 A1 A25 L32 A24 A0 L14 A9 L34 L27 A21 L28 A7 L12 | L8 L40 L9 A5 A0 | A0 A5 L8 | L12 A7 A0 | A0 A7 L11 L40 L12 | L40 L11 A6 L12 | L8 A4 L9 L40 | A5 L33 A0 | A0 L34 A7 | A0 L33 L20 A12 L19 | L34 L28 A20 L27 A0 | A1 L1 A2 L4 A3 A0 A11 L18 L0 A24 L31 A25 | A0 A9 L34 | L33 A11 A0 | A9 L14 A0 | A0 L14 L38 L15 A9 | L38 L14 A8 L15 | L17 L38 L18 A0 A11 | A0 L18 A11 | L17 A10 L18 L38 | A26 | A27 | A28 | A29
sketch "Sketch3" plane through (0, 0, 1.25) normal (0, 0, 1) x (1, 0, 0)
  line L0 (97.7, 0.025) -> (51.9, 0.025) projected
  line L1 (97.7, 42.1) -> (97.7, 0.025) projected
  line L2 (97.7, 42.1) -> (91.85, 42.1) projected
  line L3 (91.85, 7.7) -> (91.85, 42.1) projected
  line L4 (57.75, 7.7) -> (91.85, 7.7) projected
  line L5 (57.75, 7.7) -> (57.75, 42.1) projected
  line L6 (57.75, 42.1) -> (51.9, 42.1) projected
  line L7 (51.9, 0.025) -> (51.9, 42.1) projected
  circle A0 centre (94.7, 34.8) radius 2.0625 projected
  circle A1 centre (54.9, 34.8) radius 2.0625 projected
  circle A2 centre (94.7, 15) radius 2.0625 projected
  circle A3 centre (54.9, 15) radius 2.0625 projected
  point P0 (0, 0)
extrude "Extrusion3" add sketch "Sketch3" along normal blind 5 contours A0 | A1 | A2 | A3
chamfer "Chamfer1" distance 5 angle 1 1 edges at (52.8375, 34.8, 6.25) measured on face at (52.8642, 35.1308, 2.9167)
chamfer "Chamfer2" distance 5 angle 2.5 1 edges at (92.6375, 34.8, 6.25) measured on face at (95.5842, 36.6634, 4.5833)
chamfer "Chamfer3" distance 5 angle 2.5 1 edges at (52.8375, 15, 6.25) measured on face at (56.9358, 14.6692, 4.5833)
chamfer "Chamfer4" distance 5 angle 2.5 1 edges at (92.6375, 15, 6.25) measured on face at (93.8158, 13.1366, 4.5833)
properties part number "Laser Alignment Tool V2"
